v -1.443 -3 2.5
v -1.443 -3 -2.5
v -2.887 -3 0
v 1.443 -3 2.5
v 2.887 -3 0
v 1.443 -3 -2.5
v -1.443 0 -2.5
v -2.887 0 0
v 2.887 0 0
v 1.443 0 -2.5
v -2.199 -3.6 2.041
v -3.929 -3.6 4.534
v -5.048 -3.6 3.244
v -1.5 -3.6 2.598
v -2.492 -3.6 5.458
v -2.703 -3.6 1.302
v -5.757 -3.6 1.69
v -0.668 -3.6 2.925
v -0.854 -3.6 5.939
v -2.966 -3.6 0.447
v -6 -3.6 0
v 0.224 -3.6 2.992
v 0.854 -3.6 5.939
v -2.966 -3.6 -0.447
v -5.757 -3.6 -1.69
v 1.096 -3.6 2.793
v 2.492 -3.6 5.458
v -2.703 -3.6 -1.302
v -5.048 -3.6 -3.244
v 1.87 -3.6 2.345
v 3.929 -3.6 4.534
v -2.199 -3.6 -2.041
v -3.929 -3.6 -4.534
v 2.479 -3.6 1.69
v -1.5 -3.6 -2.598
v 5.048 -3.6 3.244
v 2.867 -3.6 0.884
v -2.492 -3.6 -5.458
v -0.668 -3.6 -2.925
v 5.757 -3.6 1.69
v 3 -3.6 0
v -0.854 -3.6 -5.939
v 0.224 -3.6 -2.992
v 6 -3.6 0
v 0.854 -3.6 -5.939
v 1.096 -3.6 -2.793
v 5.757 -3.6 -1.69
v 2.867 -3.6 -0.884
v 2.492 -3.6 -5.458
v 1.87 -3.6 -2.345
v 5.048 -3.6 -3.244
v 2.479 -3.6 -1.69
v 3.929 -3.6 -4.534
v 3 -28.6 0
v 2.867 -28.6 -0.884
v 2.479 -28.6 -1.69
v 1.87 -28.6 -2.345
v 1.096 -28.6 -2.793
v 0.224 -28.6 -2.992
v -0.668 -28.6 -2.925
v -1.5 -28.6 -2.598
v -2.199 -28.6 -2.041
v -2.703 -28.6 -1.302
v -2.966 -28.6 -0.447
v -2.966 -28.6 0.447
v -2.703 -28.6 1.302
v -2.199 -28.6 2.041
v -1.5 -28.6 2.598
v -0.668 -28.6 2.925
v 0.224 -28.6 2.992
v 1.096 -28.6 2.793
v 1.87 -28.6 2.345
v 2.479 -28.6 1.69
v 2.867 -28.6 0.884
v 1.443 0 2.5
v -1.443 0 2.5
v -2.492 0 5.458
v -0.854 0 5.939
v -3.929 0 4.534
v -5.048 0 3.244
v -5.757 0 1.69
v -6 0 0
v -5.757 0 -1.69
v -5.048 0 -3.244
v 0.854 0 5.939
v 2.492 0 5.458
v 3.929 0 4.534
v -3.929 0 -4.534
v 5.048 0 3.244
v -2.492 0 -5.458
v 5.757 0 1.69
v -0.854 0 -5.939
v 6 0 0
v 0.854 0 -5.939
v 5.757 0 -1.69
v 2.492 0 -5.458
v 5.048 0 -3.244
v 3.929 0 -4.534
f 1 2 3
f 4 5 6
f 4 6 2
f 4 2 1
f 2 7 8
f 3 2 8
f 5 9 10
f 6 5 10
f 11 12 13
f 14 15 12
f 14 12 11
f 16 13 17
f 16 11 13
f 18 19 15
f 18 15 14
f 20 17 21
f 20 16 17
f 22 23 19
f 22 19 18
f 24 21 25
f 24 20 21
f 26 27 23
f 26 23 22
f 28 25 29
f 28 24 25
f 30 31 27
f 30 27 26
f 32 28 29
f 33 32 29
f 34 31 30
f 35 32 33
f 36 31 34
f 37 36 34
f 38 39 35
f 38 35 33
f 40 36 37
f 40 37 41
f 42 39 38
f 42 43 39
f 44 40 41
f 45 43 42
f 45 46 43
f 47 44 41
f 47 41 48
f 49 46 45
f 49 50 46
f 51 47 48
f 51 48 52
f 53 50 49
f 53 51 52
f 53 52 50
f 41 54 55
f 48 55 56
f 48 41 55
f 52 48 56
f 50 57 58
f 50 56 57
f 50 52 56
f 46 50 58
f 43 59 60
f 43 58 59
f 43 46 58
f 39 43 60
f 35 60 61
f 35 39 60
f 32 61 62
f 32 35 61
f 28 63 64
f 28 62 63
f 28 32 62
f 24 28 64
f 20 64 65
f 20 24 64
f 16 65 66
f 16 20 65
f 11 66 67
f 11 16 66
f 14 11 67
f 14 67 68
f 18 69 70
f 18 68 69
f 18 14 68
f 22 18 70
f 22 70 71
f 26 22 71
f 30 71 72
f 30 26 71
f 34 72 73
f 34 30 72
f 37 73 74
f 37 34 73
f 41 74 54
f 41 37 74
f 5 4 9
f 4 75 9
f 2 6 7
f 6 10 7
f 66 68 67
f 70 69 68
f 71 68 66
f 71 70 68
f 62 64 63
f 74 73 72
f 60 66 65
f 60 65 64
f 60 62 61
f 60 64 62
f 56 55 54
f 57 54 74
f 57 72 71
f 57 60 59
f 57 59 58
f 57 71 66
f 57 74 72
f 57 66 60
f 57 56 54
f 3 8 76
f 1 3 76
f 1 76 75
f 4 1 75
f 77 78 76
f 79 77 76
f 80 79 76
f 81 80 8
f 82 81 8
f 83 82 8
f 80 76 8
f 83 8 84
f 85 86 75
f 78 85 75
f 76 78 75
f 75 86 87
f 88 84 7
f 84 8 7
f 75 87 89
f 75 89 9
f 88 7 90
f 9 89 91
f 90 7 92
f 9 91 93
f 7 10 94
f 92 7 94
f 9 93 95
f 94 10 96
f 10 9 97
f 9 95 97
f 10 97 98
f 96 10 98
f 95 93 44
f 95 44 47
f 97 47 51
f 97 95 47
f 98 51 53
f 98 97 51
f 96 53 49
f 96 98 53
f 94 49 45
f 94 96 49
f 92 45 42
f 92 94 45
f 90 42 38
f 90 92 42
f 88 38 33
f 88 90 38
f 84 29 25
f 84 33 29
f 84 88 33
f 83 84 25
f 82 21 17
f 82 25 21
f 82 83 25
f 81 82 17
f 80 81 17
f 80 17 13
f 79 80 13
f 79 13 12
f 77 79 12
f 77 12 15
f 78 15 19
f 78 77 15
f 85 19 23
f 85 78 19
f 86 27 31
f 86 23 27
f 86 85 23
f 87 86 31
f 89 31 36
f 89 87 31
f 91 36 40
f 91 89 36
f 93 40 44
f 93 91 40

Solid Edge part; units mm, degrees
sketch "Sketch1" plane through (0, 0, 0) normal (0, -1, 0) x (1, 0, 0)
  circle A0 centre (0, 0) radius 6
extrude "Protrusion1" add sketch "Sketch1" along normal blind 3.6
sketch "Sketch2" plane through (0, -3.6, 0) normal (0, -1, 0) x (1, 0, 0)
  circle A0 centre (0, 0) radius 3
extrude "Protrusion2" add sketch "Sketch2" along normal blind 25
cosmetic_thread "Thread1" size "M6"
sketch "Sketch3" plane through (0, 0, 0) normal (0, 1, 0) x (0, 0, -1)
  line L0 (2.5, -1.4434) -> (2.5, 1.4434)
  line L1 (2.5, 1.4434) -> (0, 2.8868)
  line L2 (0, 2.8868) -> (-2.5, 1.4434)
  line L3 (-2.5, 1.4434) -> (-2.5, -1.4434)
  line L4 (-2.5, -1.4434) -> (0, -2.8868)
  line L5 (0, -2.8868) -> (2.5, -1.4434)
extrude "ExtrudedCutout_4" cut sketch "Sketch3" against normal blind 3
properties material "Nylon, general purpose"
